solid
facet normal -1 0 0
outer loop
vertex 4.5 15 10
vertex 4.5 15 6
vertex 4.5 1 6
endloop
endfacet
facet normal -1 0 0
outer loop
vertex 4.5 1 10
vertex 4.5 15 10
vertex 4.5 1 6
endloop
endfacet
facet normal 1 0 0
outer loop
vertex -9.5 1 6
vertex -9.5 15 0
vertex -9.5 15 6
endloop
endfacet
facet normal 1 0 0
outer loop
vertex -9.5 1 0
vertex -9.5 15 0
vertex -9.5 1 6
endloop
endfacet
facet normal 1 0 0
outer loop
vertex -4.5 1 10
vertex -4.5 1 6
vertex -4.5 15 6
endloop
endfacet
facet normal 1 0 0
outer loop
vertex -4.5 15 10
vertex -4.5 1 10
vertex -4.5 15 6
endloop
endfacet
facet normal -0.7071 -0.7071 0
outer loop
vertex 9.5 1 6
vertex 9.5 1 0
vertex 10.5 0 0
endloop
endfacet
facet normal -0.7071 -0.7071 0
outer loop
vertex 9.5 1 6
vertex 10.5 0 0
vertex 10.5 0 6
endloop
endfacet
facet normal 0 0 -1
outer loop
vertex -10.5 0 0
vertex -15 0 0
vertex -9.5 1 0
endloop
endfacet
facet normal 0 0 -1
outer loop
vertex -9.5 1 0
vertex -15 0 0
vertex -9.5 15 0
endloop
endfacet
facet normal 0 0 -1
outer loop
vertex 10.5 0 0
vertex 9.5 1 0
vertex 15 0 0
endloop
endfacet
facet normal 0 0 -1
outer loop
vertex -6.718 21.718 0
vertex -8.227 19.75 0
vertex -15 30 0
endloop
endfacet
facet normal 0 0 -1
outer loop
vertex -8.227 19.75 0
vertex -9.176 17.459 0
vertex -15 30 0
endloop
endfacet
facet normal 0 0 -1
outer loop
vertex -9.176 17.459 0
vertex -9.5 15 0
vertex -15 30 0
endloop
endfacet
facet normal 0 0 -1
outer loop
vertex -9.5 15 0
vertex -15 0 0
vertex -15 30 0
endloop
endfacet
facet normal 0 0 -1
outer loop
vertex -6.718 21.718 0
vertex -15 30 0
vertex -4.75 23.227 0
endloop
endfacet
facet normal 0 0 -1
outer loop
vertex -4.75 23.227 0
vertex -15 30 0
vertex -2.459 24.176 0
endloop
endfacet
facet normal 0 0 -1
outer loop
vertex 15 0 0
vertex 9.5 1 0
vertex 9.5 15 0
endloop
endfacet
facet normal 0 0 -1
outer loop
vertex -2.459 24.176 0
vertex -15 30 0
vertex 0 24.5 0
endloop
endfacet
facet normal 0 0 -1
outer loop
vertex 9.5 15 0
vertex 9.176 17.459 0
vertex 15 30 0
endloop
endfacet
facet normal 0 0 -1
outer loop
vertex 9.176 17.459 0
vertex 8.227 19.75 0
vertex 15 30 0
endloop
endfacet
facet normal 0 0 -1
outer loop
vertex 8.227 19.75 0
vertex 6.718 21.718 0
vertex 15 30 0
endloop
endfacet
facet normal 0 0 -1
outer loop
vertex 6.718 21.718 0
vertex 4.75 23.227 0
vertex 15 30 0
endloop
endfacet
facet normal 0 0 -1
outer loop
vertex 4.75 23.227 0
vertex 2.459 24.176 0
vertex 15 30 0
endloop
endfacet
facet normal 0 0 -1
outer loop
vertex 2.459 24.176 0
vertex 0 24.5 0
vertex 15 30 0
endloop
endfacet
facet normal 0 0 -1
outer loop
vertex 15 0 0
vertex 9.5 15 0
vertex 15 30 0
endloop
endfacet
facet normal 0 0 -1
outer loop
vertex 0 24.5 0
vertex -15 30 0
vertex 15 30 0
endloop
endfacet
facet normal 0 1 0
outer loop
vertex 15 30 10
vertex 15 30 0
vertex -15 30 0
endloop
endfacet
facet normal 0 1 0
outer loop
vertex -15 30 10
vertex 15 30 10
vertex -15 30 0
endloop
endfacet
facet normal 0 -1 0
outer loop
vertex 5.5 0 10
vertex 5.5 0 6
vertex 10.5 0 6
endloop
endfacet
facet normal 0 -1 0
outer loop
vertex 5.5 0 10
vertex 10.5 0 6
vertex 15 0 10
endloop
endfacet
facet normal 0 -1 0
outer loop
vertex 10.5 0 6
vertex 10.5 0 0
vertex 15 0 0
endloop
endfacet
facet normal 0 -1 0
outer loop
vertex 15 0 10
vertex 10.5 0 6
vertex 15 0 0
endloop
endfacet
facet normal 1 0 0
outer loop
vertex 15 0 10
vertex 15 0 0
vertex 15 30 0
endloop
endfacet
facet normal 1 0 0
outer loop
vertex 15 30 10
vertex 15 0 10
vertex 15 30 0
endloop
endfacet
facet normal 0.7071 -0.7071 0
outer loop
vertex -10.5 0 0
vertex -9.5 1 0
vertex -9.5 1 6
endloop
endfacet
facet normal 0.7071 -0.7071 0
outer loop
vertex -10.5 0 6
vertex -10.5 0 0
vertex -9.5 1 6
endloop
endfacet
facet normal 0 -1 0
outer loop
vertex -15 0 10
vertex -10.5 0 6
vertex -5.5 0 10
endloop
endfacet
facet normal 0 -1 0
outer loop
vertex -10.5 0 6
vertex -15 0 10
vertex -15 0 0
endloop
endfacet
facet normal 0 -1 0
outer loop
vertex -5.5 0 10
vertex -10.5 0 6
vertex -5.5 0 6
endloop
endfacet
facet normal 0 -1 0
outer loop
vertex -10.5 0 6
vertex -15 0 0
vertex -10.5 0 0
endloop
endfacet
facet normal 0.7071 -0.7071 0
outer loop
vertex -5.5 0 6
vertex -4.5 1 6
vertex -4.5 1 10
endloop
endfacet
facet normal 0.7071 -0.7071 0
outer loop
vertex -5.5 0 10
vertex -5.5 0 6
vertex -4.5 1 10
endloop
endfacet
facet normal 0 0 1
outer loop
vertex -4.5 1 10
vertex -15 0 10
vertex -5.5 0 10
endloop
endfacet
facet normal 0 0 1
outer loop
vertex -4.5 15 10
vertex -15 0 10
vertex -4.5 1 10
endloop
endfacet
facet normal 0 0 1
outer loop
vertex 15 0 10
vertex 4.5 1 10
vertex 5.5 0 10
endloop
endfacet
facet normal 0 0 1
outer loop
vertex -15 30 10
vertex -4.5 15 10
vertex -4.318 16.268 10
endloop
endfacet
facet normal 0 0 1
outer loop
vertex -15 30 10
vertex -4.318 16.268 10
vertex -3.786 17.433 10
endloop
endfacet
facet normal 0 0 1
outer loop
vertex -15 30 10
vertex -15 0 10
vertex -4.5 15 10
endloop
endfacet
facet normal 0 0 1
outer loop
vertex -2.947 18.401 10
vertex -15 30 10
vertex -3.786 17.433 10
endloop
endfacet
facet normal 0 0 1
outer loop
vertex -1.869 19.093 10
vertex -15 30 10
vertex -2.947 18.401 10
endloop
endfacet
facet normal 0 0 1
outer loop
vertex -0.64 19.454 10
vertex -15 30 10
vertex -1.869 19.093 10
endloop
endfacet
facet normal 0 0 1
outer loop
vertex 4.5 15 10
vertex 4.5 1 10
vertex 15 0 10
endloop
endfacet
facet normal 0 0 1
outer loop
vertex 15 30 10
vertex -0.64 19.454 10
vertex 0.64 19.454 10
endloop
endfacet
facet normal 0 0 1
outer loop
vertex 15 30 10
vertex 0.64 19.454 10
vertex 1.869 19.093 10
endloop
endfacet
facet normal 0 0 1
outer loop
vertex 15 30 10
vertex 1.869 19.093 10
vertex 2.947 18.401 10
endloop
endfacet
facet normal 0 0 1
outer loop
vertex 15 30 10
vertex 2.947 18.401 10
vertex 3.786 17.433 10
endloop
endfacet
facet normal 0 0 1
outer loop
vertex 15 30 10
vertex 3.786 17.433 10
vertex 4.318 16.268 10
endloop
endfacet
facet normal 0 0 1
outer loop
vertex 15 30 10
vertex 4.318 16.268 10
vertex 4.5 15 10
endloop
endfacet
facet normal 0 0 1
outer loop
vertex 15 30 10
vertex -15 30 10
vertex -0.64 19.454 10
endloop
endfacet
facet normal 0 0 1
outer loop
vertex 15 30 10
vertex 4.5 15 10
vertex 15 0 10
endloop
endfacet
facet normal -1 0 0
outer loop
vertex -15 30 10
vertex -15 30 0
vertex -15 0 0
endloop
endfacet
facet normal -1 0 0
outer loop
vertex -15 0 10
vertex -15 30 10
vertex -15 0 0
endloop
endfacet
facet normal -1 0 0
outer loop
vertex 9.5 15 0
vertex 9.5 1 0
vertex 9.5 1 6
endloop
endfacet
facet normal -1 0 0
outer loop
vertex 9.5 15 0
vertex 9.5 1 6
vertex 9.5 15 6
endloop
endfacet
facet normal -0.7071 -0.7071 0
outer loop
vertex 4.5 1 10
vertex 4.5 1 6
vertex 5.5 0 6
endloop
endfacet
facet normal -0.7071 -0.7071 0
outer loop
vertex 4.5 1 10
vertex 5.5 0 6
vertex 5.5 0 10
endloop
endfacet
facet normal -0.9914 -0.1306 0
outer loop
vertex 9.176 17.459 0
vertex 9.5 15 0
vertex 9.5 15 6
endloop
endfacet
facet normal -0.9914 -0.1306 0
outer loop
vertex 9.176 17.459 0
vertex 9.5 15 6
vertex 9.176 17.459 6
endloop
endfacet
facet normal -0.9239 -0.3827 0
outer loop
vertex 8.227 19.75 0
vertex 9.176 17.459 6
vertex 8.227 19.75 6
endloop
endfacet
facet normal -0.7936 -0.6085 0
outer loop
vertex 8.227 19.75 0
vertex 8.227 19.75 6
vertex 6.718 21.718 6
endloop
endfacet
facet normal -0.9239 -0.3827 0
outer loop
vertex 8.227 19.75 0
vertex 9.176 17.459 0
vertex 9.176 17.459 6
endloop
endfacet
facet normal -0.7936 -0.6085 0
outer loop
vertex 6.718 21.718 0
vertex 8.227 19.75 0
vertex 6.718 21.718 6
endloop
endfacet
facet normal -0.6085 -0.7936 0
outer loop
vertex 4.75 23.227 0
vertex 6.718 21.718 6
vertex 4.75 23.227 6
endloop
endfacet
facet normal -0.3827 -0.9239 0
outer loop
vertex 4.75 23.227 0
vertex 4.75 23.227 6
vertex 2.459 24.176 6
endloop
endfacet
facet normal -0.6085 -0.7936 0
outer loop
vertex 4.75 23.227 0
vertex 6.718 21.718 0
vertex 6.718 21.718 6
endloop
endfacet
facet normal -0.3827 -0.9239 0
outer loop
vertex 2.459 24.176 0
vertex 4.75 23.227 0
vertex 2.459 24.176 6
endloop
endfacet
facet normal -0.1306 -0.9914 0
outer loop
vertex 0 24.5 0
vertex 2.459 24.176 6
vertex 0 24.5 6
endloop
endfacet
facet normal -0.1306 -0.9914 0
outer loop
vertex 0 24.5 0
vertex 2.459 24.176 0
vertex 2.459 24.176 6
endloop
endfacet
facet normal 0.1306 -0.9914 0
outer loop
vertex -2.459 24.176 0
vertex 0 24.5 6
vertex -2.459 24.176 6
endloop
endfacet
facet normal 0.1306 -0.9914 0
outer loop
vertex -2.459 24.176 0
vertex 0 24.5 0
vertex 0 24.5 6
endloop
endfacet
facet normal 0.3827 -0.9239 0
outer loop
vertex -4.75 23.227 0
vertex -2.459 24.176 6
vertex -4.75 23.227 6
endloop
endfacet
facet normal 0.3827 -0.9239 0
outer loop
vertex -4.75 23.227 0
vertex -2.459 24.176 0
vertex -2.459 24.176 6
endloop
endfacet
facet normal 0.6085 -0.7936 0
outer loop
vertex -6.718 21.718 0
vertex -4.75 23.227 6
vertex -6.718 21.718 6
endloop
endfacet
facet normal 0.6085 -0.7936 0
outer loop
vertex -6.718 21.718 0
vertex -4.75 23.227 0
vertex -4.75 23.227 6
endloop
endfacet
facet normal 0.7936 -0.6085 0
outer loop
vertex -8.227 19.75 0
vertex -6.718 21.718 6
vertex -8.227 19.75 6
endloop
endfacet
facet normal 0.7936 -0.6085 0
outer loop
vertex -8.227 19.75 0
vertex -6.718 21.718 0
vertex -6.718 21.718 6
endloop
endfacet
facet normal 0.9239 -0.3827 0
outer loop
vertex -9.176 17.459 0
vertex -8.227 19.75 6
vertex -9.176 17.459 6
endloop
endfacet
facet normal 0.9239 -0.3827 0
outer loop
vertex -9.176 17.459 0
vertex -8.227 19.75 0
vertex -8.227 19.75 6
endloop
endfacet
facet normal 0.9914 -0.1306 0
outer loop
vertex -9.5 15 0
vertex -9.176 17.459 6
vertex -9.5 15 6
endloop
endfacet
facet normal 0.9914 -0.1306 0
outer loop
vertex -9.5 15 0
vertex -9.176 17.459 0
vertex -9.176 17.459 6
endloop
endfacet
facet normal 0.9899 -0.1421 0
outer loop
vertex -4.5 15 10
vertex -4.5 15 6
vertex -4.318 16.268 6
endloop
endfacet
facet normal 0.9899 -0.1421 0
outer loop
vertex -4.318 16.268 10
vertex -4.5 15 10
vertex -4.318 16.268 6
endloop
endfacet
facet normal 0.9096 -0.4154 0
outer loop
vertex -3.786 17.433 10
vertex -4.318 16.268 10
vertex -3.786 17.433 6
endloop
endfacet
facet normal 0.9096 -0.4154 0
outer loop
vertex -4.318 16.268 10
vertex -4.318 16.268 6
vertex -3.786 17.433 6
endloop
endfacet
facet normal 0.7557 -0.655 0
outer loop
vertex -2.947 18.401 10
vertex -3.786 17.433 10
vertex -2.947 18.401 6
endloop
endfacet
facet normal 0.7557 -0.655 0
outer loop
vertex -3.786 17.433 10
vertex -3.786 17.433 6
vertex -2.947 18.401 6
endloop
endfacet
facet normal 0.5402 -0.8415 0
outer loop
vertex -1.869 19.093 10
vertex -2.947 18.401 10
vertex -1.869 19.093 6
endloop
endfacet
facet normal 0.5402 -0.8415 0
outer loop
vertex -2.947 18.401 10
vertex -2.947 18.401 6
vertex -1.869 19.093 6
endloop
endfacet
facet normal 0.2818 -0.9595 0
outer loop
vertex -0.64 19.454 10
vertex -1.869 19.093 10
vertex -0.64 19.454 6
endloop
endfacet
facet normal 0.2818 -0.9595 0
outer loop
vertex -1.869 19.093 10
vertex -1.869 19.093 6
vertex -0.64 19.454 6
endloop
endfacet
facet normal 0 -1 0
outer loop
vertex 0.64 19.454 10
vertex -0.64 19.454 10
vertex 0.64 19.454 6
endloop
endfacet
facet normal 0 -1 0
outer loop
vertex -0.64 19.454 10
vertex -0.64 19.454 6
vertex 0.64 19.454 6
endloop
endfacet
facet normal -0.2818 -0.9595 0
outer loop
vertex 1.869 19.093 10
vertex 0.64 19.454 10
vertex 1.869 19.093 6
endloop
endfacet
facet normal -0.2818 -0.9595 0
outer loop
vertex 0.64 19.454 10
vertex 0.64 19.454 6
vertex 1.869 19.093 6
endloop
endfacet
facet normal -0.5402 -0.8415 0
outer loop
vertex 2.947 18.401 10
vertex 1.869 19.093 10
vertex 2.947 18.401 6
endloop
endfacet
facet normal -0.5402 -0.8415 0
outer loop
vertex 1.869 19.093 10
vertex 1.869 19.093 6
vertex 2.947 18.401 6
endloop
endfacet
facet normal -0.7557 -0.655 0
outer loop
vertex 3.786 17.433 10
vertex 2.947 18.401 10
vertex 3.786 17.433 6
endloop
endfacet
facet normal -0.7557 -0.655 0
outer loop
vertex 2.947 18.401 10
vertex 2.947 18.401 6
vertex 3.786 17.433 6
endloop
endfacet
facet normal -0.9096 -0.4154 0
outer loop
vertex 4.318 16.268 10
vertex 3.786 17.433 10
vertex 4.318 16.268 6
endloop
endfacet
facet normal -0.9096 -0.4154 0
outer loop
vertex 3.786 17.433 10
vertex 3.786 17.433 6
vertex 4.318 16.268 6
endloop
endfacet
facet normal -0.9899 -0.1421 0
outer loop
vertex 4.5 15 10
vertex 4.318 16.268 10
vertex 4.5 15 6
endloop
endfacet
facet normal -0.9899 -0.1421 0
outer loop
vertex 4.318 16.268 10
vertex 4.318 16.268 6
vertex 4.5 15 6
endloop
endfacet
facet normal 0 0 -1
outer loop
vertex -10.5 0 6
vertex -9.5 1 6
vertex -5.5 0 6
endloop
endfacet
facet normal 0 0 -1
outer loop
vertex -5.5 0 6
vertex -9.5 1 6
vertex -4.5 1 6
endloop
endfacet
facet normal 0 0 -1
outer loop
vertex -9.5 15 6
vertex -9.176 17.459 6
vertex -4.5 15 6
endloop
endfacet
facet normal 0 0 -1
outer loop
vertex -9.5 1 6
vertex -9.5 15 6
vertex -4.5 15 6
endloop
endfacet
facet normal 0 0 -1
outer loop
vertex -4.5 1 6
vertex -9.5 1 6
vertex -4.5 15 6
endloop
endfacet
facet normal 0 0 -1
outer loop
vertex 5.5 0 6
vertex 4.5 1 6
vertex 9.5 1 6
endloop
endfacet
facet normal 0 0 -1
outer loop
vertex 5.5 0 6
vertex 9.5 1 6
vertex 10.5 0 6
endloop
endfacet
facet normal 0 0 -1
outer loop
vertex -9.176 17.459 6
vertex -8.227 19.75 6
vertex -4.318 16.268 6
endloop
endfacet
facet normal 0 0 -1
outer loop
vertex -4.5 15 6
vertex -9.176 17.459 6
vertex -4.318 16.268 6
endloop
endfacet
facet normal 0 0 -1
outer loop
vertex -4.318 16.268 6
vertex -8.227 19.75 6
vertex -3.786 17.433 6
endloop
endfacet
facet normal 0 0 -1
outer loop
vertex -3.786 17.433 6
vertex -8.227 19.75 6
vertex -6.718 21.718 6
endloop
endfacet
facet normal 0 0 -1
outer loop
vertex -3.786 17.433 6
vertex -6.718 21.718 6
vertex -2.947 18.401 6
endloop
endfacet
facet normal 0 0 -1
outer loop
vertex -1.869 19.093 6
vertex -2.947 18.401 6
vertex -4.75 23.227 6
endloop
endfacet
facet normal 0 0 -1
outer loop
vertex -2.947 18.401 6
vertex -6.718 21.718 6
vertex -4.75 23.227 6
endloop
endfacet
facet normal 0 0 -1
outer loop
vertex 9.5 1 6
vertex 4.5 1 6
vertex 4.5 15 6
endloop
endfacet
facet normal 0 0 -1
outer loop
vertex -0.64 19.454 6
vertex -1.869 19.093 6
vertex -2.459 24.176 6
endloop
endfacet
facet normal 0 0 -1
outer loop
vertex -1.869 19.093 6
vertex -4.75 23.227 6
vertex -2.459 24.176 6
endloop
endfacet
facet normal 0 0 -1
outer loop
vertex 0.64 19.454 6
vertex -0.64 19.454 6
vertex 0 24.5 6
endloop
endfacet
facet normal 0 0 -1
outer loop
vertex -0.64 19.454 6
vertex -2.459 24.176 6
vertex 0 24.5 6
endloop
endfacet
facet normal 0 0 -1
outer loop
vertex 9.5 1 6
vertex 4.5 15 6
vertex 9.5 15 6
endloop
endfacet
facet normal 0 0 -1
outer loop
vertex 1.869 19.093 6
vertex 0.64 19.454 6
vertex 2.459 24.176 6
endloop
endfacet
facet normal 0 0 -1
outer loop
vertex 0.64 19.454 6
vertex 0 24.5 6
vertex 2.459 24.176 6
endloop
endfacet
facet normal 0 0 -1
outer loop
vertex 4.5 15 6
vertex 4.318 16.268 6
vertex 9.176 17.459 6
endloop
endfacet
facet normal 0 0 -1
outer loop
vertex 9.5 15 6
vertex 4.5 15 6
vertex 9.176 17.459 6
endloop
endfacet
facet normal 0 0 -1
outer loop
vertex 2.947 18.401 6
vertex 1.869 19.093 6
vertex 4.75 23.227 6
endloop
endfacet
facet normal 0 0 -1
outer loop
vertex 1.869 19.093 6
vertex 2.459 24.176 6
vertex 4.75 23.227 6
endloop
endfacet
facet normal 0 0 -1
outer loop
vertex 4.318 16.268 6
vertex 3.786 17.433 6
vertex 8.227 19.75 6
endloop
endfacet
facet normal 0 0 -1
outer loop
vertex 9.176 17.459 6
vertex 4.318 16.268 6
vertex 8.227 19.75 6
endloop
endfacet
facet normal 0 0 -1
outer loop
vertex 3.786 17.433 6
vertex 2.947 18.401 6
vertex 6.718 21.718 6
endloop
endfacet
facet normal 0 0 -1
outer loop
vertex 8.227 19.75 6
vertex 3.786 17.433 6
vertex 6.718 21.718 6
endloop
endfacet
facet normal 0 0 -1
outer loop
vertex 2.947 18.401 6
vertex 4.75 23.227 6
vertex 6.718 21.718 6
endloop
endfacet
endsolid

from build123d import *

# Parameters (mm, degrees)
F1_DEPTH = 10
F3_DEPTH = 6
F4_SIZE  = 1


with BuildPart() as f1:
    # F0 (on Top) → F1 (new body)
    with BuildSketch(Plane.XY):
        with BuildLine():
            Line((-15, 30), (-15, 0))
            Line((-15, 0), (-4.5, 0))
            Line((-4.5, 0), (-4.5, 15))
            ThreePointArc((-4.5, 15), (0, 19.5), (4.5, 15))
            Line((4.5, 15), (4.5, 0))
            Line((4.5, 0), (15, 0))
            Line((15, 0), (15, 30))
            Line((15, 30), (-15, 30))
        make_face()
    extrude(amount=F1_DEPTH)

    # F2 (on Top) → F3 (cut)
    with BuildSketch(Plane.XY):
        with BuildLine():
            Line((4.5, 0), (9.5, 0))
            Line((9.5, 0), (9.5, 15))
            ThreePointArc((9.5, 15), (0, 24.5), (-9.5, 15))
            Line((-9.5, 15), (-9.5, 0))
            Line((-9.5, 0), (-4.5, 0))
            Line((-4.5, 0), (-4.5, 15))
            ThreePointArc((-4.5, 15), (0, 19.5), (4.5, 15))
            Line((4.5, 15), (4.5, 0))
        make_face()
    extrude(amount=F3_DEPTH, mode=Mode.SUBTRACT)

    # F4
    f4_edges = [f1.edges().sort_by_distance(p)[0] for p in [
        (-9.5, 0, 3),
        (-4.5, 0, 8),
        (9.5, 0, 3),
        (4.5, 0, 8),
    ]]
    chamfer(f4_edges, length=F4_SIZE)


solid = f1.part
